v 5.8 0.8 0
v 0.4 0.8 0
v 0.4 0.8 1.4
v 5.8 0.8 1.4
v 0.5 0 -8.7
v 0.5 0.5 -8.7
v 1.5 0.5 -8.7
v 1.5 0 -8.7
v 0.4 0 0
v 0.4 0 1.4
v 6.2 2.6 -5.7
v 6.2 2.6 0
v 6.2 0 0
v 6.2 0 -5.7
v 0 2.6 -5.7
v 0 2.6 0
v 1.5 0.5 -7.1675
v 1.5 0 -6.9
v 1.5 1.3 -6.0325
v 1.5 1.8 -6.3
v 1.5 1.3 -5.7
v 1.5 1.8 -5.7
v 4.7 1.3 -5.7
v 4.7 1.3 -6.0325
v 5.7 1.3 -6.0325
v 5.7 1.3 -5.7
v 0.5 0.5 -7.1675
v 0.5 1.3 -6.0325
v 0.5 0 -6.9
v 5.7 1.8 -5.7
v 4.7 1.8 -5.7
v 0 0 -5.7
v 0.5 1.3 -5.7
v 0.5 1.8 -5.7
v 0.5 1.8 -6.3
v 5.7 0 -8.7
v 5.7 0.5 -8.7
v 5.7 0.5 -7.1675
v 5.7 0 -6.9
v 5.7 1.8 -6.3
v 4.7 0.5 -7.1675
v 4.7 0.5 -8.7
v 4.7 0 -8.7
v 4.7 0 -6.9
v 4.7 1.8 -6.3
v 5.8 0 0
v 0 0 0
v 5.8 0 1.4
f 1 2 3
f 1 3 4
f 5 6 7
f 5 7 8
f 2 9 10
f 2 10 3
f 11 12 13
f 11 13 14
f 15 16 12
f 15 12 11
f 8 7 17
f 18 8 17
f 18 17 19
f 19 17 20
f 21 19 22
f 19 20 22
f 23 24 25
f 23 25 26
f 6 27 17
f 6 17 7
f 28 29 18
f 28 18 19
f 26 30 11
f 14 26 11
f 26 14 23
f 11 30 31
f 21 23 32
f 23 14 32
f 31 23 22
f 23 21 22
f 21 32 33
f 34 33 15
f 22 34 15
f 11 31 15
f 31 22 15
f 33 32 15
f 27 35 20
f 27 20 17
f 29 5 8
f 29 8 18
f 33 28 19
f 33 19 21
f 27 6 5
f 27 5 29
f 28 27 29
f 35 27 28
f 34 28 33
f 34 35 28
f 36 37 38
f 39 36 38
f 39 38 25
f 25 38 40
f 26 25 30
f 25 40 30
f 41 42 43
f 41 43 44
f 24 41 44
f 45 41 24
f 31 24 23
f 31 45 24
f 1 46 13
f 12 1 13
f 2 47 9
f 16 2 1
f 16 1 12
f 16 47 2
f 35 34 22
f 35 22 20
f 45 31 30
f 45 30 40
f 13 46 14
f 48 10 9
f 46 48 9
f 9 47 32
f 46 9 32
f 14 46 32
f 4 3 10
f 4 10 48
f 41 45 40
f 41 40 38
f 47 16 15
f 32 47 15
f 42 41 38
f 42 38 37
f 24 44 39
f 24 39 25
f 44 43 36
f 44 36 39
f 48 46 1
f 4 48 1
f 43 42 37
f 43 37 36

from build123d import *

# Parameters (mm, degrees)
CROQUIS1_W              = 5.7
CROQUIS1_H              = 2.6
SALIENTE_EXTRUIR1_DEPTH = 6.2
CROQUIS2_W              = 5.4
CROQUIS2_H              = 0.8
SALIENTE_EXTRUIR2_DEPTH = 1.4
SALIENTE_EXTRUIR3_DEPTH = 1
MATRIZL1_COUNT          = 2
MATRIZL1_PITCH          = 4.2


with BuildPart() as part:
    # Croquis1 → Saliente-Extruir1 (new body)
    with BuildSketch(Plane(origin=(0, 0, 0), x_dir=(0, 0, -1), z_dir=(1, 0, 0))):
        with Locations((2.85, 1.3)):
            Rectangle(CROQUIS1_W, CROQUIS1_H)
    extrude(amount=SALIENTE_EXTRUIR1_DEPTH)

    # Croquis2 → Saliente-Extruir2 (add)
    with BuildSketch(Plane.XY):
        with Locations((3.1, 0.4)):
            Rectangle(CROQUIS2_W, CROQUIS2_H)
    extrude(amount=SALIENTE_EXTRUIR2_DEPTH)

    # Croquis3 → Saliente-Extruir3 (add)
    with BuildSketch(Plane.ZY.offset(-0.5)):
        Polygon((-5.7, 1.8), (-6.3, 1.8), (-7.167456635, 0.5), (-8.7, 0.5), (-8.7, 0), (-6.9, 0), (-6.032543365, 1.3), (-5.7, 1.3), align=None)
    saliente_extruir3 = extrude(amount=-SALIENTE_EXTRUIR3_DEPTH)

    # MatrizL1: Saliente-Extruir3 ×2
    with Locations(*[(i * MATRIZL1_PITCH, 0, 0) for i in range(1, MATRIZL1_COUNT)]):
        add(saliente_extruir3)


solid = part.part
